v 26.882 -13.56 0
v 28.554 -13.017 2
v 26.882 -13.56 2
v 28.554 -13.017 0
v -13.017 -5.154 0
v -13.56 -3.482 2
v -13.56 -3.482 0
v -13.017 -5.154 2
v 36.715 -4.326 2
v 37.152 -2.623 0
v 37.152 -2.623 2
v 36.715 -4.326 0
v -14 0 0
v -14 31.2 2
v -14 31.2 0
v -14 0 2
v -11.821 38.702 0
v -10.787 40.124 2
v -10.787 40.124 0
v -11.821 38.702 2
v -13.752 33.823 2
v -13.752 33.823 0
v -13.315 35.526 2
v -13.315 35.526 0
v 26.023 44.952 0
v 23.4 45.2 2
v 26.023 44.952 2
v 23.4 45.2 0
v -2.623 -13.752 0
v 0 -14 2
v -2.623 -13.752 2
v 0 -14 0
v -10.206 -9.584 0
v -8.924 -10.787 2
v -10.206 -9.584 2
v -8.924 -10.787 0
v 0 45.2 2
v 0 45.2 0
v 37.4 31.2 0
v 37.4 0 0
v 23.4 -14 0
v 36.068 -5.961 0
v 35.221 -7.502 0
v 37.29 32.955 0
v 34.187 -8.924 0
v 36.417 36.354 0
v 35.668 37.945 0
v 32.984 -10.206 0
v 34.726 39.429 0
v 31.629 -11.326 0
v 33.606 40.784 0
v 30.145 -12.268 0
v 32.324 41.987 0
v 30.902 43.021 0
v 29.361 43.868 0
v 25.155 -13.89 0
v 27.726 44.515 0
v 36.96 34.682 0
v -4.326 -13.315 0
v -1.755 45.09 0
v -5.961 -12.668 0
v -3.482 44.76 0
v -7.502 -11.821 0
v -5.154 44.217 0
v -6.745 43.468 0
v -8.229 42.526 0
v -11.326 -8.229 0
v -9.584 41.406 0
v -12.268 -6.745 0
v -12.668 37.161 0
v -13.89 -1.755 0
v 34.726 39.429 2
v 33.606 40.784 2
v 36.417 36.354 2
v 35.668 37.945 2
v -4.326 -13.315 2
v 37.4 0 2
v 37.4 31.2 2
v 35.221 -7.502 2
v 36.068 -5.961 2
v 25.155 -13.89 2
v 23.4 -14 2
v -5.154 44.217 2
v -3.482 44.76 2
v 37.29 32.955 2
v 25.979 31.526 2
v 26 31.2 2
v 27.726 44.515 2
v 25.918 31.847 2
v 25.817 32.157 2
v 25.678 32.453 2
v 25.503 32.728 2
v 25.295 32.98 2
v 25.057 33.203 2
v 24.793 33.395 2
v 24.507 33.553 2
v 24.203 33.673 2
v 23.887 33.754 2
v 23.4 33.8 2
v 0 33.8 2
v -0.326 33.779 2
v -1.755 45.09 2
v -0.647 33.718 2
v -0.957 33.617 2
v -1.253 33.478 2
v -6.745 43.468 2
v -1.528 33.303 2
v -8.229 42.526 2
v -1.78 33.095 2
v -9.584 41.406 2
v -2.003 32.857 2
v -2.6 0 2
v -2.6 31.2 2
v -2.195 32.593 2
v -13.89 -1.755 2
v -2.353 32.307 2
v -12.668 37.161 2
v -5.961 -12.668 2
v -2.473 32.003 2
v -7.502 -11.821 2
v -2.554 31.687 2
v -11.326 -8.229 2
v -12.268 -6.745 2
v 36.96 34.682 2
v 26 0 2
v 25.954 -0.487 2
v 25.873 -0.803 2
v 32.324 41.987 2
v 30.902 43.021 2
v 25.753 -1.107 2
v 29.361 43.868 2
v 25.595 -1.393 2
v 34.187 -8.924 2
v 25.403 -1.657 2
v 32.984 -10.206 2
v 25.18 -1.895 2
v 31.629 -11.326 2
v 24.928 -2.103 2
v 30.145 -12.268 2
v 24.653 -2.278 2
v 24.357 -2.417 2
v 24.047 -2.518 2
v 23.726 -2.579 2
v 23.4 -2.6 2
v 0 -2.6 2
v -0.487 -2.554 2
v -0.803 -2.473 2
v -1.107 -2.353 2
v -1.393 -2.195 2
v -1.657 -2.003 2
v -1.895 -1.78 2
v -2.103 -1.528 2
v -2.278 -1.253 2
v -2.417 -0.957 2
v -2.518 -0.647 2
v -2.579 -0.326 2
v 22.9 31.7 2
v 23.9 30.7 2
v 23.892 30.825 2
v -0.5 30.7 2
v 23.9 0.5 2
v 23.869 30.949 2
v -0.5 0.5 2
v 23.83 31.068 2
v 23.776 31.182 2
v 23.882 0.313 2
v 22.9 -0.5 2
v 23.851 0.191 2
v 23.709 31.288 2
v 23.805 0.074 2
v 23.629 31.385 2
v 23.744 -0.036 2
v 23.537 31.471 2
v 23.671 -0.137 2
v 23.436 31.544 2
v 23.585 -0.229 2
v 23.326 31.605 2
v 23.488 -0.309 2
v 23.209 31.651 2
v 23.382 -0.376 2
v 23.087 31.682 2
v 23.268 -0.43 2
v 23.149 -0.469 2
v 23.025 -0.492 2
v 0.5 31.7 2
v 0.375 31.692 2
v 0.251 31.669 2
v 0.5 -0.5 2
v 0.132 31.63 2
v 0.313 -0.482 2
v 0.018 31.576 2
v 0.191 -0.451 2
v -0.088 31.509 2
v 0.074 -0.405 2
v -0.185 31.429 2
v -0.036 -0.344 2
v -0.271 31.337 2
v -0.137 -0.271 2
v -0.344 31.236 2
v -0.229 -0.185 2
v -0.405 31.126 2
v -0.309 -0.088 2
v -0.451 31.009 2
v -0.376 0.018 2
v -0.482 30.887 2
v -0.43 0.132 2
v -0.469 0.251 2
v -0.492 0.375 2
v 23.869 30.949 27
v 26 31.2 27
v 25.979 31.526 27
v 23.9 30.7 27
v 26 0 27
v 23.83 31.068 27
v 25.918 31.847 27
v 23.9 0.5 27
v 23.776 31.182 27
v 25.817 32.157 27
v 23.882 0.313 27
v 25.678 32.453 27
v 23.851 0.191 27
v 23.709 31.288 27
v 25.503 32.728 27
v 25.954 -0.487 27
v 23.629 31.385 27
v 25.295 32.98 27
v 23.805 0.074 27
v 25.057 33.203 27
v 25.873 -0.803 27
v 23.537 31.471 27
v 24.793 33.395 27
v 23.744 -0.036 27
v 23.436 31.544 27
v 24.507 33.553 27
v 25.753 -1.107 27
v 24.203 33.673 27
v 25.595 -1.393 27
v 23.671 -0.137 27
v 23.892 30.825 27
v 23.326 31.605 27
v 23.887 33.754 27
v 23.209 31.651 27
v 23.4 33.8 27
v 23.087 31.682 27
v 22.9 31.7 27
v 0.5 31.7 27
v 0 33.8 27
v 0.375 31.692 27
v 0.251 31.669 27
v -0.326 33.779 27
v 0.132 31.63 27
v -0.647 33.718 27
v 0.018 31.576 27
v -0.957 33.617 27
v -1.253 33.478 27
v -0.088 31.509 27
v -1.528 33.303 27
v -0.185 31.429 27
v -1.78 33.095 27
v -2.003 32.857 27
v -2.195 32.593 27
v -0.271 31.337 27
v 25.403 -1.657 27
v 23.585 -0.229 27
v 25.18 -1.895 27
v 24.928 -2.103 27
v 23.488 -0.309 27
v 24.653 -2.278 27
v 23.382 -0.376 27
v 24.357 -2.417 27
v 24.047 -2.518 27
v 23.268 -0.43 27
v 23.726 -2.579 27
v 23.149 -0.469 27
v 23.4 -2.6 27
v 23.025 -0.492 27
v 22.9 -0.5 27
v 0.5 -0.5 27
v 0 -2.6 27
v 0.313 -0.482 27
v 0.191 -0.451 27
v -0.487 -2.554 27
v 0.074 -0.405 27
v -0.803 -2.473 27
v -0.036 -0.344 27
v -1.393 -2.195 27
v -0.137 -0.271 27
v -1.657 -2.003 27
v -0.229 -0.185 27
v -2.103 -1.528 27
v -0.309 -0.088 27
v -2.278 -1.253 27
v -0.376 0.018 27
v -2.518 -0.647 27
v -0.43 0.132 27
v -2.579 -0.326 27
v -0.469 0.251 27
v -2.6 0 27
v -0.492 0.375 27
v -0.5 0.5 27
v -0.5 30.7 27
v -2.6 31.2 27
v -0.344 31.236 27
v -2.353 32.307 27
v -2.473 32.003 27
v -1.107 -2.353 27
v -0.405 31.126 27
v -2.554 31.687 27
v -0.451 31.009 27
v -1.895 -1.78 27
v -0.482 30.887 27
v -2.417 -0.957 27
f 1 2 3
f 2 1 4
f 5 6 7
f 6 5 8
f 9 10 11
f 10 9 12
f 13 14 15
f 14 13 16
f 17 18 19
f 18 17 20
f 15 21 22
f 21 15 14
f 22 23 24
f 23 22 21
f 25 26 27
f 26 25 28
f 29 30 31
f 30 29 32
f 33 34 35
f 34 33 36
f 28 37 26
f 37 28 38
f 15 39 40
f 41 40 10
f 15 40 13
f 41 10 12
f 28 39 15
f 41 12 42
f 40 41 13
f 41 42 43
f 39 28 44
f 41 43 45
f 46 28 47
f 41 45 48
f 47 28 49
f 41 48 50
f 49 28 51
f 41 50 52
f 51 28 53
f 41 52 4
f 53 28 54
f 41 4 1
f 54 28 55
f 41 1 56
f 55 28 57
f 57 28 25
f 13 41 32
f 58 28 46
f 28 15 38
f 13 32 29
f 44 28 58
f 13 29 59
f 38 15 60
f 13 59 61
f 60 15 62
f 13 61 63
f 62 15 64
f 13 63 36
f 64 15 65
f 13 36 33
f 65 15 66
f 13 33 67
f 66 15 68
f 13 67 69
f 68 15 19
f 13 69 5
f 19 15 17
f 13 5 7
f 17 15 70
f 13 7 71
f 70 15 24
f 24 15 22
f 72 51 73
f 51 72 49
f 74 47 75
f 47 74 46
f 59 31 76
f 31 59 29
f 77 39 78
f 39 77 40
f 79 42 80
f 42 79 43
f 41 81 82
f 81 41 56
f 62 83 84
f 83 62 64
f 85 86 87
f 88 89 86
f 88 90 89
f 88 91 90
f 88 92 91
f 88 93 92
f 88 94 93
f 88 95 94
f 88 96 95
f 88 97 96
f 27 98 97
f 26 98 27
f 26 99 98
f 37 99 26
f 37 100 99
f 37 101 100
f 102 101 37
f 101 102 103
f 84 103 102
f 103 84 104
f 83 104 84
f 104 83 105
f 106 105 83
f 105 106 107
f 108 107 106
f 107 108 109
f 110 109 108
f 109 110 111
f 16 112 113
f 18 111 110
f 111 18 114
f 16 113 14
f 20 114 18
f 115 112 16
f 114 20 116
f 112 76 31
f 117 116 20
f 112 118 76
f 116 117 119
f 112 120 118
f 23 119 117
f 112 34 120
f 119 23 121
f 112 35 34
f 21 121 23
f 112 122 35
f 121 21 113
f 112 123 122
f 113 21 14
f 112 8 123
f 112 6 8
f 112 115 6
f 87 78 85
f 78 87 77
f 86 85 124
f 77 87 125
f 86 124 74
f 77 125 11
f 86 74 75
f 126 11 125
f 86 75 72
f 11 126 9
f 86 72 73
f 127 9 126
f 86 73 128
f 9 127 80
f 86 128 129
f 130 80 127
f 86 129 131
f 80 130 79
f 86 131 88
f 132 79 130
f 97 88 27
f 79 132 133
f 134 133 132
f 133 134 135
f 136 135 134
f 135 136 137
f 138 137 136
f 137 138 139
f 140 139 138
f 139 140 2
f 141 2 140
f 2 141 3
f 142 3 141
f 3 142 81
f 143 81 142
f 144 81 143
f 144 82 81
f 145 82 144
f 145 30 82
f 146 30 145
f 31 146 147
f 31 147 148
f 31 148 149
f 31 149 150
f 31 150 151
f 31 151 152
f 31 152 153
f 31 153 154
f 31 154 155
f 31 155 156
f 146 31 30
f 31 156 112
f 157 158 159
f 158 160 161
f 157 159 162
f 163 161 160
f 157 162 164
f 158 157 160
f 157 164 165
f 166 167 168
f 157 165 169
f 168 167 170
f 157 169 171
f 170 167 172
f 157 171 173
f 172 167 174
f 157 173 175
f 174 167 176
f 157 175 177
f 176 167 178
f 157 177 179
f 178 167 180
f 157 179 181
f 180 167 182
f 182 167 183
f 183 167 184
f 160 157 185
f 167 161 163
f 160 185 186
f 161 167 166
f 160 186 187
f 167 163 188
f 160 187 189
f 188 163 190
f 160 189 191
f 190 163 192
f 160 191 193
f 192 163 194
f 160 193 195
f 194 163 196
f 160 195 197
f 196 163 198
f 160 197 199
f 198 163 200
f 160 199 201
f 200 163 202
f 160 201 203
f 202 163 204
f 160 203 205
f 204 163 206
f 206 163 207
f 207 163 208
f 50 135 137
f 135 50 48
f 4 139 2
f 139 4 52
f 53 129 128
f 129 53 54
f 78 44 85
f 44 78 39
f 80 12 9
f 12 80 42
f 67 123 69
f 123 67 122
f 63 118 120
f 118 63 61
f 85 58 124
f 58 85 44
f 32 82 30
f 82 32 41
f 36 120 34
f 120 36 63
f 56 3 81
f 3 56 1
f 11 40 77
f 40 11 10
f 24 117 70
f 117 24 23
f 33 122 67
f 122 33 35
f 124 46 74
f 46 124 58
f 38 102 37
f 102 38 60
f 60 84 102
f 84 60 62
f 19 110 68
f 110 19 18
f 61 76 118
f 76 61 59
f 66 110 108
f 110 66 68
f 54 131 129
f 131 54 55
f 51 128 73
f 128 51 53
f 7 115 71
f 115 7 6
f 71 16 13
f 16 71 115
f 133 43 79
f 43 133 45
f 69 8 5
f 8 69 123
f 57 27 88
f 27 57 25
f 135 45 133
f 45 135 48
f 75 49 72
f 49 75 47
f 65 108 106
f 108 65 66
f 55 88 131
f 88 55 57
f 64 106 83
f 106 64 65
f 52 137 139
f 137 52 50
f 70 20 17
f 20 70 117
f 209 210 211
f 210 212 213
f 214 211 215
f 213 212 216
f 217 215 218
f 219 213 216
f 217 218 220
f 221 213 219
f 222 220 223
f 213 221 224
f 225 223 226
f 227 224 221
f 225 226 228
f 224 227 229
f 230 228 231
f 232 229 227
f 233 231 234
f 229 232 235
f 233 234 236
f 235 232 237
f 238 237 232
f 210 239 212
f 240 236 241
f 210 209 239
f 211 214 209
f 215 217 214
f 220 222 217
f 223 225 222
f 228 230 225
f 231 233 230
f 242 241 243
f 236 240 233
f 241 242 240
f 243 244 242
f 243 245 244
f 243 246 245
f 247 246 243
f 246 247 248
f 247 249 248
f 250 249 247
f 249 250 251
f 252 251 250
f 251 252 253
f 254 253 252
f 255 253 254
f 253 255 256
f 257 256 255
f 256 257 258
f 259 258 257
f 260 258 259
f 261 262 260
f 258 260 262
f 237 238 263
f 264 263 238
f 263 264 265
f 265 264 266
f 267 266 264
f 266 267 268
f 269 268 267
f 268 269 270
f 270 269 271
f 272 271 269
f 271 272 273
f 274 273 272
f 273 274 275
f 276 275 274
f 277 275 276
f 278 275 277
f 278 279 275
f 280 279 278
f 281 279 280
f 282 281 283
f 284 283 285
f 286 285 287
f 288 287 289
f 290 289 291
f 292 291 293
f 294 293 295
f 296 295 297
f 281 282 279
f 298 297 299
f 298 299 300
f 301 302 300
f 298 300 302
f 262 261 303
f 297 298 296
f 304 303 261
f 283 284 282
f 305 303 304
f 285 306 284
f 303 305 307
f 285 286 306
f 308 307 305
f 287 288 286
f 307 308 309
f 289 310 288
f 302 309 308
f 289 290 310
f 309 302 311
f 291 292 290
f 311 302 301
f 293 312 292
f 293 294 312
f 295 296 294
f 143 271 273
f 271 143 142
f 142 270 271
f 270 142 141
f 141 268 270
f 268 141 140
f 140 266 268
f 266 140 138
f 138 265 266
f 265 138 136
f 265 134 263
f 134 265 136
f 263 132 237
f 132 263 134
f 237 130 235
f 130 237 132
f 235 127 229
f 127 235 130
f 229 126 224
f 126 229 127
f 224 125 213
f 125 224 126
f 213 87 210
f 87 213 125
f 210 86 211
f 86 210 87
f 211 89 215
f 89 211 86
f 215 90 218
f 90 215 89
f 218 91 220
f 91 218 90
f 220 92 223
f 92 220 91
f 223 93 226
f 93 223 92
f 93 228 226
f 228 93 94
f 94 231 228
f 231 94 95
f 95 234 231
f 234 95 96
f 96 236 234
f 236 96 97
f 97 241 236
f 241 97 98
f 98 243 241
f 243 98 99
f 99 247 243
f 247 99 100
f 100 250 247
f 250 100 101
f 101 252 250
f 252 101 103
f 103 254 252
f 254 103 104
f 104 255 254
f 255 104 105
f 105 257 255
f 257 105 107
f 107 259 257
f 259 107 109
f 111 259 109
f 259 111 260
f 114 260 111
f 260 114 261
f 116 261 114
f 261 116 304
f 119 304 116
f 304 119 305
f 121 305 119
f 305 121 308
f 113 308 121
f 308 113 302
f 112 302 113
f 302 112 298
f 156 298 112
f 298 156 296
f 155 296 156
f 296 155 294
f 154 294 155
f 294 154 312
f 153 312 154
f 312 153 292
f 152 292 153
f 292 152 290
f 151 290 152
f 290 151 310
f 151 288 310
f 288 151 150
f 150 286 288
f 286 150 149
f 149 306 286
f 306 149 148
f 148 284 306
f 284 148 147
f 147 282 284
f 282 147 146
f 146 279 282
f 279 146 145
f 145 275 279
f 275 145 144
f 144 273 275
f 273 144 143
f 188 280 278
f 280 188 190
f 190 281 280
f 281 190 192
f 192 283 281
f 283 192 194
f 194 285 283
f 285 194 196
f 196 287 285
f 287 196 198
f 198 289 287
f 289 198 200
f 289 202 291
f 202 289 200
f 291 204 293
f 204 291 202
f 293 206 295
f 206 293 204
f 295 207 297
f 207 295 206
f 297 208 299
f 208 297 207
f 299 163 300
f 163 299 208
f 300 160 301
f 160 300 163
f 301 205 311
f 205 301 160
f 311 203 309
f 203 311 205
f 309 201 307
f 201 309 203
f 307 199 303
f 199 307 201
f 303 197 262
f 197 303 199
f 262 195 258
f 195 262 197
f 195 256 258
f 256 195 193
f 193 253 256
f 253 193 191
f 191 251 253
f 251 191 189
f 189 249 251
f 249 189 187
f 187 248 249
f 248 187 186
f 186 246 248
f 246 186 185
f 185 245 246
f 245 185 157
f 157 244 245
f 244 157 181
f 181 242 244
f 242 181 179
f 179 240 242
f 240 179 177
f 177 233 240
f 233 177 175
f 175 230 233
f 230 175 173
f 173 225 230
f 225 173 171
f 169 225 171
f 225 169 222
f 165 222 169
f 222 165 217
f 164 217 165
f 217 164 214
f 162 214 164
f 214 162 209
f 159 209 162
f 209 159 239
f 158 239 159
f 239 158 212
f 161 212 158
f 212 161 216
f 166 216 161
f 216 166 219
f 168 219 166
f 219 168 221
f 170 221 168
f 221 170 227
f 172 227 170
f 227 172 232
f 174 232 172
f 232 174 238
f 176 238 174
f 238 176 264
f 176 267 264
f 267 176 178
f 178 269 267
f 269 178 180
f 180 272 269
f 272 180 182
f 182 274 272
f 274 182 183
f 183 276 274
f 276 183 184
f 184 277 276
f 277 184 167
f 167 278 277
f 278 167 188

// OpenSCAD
$fn=50;
ow=23.4;
oh=31.2;
linear_extrude(2) offset(14) square([ow,oh]);
linear_extrude(27)
difference(){
  offset(2.6) square([ow,oh]);
  translate([.5,.5]) offset(1) square([ow-1,oh-1]);
}
